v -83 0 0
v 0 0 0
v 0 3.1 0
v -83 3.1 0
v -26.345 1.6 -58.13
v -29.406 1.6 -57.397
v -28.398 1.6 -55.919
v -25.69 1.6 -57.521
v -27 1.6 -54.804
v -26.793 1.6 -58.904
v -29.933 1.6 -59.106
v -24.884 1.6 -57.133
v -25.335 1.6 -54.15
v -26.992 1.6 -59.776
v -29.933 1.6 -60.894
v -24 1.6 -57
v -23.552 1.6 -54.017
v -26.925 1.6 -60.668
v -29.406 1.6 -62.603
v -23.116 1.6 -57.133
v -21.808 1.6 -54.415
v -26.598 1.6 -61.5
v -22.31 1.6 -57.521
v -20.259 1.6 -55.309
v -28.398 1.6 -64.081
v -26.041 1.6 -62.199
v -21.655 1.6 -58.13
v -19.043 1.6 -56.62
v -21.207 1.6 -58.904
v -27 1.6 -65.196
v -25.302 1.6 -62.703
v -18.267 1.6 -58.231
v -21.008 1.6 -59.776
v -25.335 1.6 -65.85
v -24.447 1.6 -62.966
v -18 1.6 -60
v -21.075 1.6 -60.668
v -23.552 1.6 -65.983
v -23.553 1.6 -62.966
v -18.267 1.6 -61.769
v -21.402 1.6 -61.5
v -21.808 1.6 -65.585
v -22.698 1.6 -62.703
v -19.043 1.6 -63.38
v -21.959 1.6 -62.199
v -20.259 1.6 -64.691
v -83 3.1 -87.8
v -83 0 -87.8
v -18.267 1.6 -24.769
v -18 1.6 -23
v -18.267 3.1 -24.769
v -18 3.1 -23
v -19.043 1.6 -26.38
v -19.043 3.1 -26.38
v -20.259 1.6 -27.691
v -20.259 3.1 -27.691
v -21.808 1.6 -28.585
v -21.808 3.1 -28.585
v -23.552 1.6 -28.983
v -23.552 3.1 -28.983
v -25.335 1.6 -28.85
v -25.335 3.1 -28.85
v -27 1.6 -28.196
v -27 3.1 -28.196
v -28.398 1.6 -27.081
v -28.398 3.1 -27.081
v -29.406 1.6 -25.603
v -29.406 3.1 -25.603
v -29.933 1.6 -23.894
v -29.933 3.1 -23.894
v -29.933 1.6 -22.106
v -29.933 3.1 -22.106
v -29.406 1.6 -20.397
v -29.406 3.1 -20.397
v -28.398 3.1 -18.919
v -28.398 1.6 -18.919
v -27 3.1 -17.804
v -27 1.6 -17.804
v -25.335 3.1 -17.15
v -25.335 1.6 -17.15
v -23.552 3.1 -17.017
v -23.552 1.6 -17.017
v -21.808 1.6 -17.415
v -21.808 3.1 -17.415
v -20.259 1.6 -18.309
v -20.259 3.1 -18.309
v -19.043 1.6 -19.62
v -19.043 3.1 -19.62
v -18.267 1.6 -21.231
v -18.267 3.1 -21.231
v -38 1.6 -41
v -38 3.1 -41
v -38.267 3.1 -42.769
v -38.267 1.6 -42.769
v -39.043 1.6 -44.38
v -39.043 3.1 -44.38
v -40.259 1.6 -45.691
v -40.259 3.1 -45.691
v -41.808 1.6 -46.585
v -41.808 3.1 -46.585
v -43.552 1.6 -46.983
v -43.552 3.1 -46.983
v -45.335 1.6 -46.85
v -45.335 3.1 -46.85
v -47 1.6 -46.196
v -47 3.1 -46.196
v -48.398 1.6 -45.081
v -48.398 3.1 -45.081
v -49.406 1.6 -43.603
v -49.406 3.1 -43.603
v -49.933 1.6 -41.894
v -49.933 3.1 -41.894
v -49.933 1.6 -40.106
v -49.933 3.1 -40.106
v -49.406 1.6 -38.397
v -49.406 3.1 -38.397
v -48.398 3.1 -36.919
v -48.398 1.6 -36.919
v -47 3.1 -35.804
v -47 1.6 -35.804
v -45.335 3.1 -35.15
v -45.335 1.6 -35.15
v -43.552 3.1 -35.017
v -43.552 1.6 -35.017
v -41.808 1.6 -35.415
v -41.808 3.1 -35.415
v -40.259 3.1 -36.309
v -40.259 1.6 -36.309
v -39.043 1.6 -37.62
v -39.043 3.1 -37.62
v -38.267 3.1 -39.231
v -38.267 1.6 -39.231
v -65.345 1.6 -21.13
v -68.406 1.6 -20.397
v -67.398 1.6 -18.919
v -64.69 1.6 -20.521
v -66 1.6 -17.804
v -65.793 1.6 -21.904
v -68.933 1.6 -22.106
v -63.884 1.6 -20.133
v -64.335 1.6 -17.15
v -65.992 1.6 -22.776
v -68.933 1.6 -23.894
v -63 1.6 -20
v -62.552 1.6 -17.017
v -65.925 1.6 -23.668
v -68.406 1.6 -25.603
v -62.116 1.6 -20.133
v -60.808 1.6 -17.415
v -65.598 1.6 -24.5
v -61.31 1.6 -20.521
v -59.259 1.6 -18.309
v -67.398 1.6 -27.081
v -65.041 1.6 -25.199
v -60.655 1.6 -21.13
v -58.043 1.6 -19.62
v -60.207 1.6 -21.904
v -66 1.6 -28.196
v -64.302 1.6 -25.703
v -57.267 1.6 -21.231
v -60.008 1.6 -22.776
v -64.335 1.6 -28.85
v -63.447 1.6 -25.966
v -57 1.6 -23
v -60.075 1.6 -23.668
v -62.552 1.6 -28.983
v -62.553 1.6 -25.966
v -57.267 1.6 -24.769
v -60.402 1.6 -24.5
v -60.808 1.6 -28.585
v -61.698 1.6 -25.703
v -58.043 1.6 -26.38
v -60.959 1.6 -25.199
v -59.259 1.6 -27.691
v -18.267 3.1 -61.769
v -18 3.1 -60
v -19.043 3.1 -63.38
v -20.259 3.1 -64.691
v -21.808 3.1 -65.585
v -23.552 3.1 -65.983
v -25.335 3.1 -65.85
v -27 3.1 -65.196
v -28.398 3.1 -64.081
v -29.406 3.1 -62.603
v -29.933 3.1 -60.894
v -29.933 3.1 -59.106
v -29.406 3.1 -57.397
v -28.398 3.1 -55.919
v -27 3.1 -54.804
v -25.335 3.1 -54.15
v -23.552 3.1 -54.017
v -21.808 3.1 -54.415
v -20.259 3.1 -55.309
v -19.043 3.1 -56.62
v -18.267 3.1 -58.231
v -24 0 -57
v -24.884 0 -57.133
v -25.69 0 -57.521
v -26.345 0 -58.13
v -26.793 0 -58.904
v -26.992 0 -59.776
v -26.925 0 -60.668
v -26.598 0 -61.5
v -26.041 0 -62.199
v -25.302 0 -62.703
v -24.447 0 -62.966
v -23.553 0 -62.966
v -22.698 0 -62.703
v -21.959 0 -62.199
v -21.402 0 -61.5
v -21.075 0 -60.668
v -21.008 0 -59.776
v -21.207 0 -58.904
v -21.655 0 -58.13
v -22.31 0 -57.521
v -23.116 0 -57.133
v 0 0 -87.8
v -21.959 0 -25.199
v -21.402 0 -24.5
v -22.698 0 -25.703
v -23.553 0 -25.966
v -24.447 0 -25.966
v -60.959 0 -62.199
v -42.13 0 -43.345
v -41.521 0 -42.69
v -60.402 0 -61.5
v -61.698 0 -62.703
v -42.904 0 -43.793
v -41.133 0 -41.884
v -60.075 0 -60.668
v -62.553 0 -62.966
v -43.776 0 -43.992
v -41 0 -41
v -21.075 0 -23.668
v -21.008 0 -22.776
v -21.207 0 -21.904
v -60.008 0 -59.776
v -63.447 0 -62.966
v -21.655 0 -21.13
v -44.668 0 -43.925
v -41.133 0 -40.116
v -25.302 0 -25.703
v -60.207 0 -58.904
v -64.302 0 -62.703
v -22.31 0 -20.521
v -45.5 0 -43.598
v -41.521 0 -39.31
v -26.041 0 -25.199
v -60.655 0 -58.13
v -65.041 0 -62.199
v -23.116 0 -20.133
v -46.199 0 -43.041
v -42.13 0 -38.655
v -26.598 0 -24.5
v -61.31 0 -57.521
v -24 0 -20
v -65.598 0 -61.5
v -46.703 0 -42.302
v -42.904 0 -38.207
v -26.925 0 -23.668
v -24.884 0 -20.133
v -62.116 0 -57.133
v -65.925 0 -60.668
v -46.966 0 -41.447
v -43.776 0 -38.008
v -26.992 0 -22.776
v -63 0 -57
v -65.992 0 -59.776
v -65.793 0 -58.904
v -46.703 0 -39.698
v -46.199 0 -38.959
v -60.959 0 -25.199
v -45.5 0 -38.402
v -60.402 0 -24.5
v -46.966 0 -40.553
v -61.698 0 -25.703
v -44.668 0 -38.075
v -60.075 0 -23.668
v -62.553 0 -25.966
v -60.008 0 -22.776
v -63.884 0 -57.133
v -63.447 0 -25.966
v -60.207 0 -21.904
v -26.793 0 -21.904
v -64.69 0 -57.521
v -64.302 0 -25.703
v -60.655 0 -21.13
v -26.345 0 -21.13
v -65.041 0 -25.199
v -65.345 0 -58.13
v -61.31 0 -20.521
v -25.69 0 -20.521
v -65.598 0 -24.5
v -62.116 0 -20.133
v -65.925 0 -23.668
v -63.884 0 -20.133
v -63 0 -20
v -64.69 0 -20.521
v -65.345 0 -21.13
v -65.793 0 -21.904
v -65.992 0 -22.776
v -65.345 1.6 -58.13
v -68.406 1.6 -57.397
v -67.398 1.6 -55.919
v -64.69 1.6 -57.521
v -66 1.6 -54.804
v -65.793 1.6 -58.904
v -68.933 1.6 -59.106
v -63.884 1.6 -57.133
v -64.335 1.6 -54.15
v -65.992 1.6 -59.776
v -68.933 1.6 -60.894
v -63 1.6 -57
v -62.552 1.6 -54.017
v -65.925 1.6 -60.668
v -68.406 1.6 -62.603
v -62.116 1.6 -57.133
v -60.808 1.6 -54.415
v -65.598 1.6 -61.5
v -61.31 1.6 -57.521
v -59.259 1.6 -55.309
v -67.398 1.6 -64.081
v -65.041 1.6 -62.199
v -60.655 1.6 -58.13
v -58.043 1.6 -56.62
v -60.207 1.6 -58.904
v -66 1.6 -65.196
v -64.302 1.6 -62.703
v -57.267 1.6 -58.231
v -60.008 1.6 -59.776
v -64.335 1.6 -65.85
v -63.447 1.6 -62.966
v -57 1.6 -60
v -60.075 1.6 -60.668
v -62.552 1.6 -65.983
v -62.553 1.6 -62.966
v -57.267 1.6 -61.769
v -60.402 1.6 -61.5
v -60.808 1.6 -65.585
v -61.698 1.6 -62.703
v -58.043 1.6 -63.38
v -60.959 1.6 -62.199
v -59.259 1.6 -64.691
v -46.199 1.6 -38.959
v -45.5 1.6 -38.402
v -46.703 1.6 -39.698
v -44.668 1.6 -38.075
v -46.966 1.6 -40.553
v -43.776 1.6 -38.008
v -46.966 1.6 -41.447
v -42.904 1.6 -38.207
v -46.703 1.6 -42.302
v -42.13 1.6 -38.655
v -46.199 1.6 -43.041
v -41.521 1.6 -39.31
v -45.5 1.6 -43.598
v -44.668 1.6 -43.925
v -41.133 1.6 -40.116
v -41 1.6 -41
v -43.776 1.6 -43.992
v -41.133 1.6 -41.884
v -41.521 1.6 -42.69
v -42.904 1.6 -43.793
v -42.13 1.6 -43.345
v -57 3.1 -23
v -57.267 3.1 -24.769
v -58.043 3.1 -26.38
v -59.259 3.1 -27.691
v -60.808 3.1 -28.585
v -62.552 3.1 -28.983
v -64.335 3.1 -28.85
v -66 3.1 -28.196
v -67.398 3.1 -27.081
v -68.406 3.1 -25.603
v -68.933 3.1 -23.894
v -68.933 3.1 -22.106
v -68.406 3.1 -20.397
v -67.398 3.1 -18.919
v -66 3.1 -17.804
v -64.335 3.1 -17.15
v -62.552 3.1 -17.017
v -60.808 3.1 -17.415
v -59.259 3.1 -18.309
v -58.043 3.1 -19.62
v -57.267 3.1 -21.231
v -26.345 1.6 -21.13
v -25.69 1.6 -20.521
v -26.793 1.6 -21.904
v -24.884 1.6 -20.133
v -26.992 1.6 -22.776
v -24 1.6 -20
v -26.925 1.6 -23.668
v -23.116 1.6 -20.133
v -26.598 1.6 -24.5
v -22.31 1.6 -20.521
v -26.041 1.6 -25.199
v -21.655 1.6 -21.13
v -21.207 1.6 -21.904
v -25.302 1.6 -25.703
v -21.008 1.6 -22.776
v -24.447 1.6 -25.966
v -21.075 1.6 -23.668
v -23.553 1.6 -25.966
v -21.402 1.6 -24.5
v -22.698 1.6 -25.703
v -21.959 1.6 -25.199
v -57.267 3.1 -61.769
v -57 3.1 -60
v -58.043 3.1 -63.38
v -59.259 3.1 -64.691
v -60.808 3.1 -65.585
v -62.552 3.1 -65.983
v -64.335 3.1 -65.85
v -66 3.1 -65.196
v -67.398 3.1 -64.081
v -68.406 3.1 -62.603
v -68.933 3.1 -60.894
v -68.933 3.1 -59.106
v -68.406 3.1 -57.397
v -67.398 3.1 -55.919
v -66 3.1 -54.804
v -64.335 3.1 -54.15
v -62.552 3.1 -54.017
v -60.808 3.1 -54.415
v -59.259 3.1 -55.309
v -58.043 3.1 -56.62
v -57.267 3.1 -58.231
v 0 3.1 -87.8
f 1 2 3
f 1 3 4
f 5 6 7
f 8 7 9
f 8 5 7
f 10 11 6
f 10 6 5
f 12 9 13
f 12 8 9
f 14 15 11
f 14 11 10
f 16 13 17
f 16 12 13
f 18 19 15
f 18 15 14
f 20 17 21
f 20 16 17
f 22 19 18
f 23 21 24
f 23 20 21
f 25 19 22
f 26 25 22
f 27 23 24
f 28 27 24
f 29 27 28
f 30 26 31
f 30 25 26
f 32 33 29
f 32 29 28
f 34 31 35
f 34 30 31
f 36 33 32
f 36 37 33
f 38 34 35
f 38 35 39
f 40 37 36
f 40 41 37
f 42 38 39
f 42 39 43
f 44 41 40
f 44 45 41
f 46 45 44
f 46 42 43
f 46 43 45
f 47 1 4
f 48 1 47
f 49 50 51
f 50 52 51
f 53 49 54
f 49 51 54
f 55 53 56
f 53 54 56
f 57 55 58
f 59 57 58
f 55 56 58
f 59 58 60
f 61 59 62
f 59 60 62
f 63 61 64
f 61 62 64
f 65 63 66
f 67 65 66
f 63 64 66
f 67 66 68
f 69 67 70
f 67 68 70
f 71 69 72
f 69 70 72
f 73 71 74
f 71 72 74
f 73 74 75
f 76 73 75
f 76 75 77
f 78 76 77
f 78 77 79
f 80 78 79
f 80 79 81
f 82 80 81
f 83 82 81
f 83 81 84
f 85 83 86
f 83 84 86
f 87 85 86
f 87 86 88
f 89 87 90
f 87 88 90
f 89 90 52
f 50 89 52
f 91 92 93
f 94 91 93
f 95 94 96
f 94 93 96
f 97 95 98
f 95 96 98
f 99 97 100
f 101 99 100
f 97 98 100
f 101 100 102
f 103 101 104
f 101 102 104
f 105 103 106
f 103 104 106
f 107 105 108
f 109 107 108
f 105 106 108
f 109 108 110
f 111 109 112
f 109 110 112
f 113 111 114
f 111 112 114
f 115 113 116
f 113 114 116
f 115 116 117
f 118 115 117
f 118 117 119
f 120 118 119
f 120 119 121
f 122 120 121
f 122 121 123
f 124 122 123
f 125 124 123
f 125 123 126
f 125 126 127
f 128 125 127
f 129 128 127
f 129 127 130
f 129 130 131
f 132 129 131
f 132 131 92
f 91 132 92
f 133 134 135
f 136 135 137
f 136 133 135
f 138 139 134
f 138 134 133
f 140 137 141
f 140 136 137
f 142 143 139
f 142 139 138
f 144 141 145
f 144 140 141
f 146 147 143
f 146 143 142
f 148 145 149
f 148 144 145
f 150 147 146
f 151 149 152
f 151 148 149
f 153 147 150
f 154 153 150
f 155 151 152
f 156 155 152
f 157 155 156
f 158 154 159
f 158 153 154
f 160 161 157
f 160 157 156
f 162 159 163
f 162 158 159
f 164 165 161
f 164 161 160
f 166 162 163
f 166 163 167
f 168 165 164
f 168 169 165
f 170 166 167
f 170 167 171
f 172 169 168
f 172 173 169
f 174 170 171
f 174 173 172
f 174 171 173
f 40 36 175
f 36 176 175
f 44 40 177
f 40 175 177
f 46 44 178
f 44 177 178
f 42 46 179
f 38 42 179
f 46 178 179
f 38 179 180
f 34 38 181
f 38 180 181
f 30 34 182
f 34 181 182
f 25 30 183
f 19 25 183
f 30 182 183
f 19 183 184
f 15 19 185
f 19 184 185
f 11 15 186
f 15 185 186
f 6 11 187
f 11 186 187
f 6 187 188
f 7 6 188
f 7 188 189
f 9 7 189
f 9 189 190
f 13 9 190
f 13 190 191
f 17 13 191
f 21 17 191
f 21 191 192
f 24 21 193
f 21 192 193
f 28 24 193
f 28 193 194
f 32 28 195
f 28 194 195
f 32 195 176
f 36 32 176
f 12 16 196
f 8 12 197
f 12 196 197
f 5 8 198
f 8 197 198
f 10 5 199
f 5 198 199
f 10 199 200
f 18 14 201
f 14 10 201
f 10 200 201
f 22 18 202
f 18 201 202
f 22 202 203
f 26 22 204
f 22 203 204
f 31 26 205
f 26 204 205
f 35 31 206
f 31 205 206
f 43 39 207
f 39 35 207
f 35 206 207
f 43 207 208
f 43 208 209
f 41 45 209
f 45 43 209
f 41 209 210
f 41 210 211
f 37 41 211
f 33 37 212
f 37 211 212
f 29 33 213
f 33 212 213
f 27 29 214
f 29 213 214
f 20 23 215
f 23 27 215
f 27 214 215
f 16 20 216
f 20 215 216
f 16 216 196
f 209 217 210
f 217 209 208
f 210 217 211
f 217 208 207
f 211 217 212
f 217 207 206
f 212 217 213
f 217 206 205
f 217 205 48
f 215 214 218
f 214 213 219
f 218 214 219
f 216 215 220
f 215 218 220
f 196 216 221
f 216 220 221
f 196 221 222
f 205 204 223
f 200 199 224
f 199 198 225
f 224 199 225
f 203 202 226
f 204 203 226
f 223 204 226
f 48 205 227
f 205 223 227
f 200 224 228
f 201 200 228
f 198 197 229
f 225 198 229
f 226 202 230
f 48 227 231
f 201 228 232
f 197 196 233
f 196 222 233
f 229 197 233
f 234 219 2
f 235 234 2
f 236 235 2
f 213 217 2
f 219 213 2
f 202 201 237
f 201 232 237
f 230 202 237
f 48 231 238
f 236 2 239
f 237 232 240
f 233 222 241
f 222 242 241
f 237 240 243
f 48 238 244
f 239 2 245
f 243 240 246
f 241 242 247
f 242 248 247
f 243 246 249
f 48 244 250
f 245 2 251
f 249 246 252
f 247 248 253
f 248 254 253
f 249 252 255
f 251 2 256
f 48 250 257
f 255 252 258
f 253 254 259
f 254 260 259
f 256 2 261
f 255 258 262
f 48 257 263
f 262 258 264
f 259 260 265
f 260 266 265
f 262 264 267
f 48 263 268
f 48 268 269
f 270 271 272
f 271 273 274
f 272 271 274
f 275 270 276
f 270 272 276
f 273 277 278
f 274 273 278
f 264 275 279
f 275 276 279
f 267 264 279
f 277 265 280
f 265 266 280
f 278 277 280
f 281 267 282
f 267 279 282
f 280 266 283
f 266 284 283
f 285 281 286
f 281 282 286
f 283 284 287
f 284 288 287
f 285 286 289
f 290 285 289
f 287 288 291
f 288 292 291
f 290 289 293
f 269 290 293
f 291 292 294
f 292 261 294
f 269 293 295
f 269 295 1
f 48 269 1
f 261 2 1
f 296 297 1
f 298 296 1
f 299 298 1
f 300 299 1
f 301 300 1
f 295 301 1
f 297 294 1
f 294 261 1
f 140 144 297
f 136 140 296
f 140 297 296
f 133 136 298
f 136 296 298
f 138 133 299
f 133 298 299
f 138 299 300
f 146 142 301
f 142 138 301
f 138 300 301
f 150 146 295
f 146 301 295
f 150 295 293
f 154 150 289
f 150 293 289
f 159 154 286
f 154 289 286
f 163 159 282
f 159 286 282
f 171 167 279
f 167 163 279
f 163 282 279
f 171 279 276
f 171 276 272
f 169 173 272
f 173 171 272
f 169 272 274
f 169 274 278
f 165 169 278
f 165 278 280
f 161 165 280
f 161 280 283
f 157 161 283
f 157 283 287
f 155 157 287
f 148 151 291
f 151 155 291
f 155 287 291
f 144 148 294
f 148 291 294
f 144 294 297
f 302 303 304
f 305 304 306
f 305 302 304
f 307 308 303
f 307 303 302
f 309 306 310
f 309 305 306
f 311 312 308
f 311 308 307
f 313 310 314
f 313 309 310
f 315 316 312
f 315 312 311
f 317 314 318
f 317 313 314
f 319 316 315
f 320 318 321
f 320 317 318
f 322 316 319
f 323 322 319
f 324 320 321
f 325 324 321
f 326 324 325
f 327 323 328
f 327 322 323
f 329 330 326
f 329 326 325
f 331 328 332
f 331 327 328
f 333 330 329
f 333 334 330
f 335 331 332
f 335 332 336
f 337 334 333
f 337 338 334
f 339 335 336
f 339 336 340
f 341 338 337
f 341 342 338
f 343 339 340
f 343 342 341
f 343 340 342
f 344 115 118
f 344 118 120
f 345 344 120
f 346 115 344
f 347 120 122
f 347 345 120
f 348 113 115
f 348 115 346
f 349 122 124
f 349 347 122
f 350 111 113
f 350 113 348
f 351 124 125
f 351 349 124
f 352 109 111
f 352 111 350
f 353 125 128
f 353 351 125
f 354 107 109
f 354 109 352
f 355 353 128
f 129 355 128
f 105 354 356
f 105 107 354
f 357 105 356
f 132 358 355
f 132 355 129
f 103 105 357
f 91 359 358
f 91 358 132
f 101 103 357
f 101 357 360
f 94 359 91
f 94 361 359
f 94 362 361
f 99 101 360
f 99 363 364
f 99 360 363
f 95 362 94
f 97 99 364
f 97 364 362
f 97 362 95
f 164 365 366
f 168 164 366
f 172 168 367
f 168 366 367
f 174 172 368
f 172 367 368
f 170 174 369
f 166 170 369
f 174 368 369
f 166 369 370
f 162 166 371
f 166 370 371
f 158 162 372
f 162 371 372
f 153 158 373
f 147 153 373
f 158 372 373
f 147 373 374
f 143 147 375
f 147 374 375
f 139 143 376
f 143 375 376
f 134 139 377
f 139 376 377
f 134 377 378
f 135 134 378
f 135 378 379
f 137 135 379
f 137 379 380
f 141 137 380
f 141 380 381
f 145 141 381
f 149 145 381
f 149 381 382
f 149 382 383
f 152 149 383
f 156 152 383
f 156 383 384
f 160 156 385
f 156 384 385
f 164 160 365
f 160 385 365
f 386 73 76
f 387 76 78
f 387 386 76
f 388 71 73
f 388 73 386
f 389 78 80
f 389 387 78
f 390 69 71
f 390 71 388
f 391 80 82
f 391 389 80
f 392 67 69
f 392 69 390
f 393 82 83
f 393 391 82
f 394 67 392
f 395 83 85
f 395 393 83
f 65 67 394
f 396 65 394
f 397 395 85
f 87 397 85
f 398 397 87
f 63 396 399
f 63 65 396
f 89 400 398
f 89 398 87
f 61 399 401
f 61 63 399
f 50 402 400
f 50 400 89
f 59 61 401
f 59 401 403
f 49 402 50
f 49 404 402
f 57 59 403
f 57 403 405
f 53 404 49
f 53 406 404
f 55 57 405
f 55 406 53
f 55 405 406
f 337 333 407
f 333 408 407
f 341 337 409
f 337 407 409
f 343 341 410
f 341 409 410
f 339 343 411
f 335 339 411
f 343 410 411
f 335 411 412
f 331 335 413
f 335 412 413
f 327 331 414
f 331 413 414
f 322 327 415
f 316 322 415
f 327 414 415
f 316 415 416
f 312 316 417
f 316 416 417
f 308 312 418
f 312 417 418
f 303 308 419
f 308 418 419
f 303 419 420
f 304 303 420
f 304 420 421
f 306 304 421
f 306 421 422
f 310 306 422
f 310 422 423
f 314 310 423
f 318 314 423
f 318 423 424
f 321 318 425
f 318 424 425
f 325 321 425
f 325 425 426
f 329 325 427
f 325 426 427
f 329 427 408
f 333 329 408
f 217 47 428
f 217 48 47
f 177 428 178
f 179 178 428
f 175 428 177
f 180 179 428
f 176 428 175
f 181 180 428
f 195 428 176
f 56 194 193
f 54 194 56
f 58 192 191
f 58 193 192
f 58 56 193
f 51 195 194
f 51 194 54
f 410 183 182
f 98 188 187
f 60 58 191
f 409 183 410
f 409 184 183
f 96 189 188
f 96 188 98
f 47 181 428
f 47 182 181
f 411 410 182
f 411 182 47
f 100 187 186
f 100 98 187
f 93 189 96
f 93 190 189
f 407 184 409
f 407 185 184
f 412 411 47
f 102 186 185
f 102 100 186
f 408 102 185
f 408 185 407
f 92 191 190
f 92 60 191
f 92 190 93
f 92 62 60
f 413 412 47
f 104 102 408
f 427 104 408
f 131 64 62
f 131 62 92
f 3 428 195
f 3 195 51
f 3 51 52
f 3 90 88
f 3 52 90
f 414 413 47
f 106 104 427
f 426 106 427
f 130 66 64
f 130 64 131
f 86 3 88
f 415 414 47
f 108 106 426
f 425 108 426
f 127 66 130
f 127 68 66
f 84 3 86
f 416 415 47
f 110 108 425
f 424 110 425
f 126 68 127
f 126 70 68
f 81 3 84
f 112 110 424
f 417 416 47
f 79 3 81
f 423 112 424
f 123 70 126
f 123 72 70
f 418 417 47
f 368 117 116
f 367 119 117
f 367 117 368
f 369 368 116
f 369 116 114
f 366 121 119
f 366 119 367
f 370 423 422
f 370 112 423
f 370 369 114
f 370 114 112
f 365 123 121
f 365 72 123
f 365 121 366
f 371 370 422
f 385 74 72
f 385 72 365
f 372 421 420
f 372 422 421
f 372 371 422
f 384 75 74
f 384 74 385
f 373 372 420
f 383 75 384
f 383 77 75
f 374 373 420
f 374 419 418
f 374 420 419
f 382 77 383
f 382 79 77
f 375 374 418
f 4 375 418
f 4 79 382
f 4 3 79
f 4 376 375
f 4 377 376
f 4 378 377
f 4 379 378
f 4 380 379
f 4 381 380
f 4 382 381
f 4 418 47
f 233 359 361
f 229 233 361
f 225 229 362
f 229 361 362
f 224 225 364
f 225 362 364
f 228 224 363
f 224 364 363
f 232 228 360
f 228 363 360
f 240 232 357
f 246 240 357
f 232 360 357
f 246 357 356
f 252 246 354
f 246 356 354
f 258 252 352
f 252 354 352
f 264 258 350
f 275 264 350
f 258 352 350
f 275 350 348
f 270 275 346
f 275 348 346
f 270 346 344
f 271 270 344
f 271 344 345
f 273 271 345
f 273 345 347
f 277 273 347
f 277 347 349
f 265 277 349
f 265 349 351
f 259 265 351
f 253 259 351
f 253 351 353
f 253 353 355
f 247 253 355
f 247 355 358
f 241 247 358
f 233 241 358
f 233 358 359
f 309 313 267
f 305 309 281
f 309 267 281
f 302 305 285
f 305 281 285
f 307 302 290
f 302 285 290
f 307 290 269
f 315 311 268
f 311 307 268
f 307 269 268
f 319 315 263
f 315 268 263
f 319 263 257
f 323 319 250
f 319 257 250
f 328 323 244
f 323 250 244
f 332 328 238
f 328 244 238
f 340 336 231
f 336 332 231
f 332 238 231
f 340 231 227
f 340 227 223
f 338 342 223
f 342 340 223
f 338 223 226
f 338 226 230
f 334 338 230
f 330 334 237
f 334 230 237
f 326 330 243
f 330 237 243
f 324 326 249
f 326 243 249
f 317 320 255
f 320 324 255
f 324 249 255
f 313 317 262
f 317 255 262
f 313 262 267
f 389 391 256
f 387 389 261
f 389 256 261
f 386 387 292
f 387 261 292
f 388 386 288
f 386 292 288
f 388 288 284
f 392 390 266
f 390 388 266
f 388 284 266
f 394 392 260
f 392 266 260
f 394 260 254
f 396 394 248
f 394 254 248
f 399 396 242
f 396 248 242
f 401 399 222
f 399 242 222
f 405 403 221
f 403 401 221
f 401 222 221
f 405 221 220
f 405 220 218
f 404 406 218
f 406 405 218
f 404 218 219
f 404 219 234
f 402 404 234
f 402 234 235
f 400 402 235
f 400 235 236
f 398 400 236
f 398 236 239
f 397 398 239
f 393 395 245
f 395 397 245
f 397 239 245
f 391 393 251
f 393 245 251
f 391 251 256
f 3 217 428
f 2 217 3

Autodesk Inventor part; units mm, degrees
ref_plane "YZ Plane" through (0, 0, 0) normal (1, 0, 0) x (0, 1, 0)
ref_plane "XZ Plane" through (0, 0, 0) normal (0, 1, 0) x (-1, 0, 0)
ref_plane "XY Plane" through (0, 0, 0) normal (0, 0, 1) x (1, 0, 0)
sketch "草圖1" plane through (0, 0, 0) normal (0, 1, 0) x (-1, 0, 0)
  line L0 (0, 0) -> (83, 0)
  line L1 (83, 0) -> (83, -87.8)
  line L2 (83, -87.8) -> (0, -87.8)
  line L3 (0, -87.8) -> (0, 0)
  dimension "d0" = 87.8
  dimension "d1" = 83
extrude "擠出1" add sketch "草圖1" along normal blind 3.1
sketch "草圖2" plane through (0, 3.1, 0) normal (0, 1, 0) x (1, 0, 0)
  line L0 (-24, -18.3432) -> (-24, 108.3328)
  line L1 (-63, -18.3432) -> (-63, 117.1807)
  line L2 (-93.8741, 60) -> (24.8173, 60)
  line L3 (19.8538, 23) -> (-101.6429, 23)
  line L4 (-44, -5.6109) -> (-44, 94.0899)
  line L5 (-89.7738, 41) -> (11.6533, 41)
  line L6 (-83, 0) -> (0, 0) projected
  line L7 (0, 0) -> (0, 87.8) projected
  circle A0 centre (-63, 23) radius 6
  circle A1 centre (-24, 23) radius 6
  circle A2 centre (-24, 60) radius 6
  circle A3 centre (-63, 60) radius 6
  circle A4 centre (-44, 41) radius 6
  dimension "d4" = 23
  dimension "d5" = 37
  dimension "d6" = 24
  dimension "d7" = 44
  dimension "d8" = 39
  dimension "d9" = 41
  dimension "d10" = 12
  dimension "d11" = 12
  dimension "d12" = 12
  dimension "d13" = 12
  dimension "d14" = 12
hole "孔1" at (-24, 3.1, -23) at (-63, 3.1, -23) at (-63, 3.1, -60) at (-24, 3.1, -60) direction (0, -1, 0) diameter 6 end through all
sketch "草圖4" plane through (0, 3.1, 0) normal (0, 1, 0) x (1, 0, 0)
  point P0 (0, 0)
sketch "草圖5" plane through (0, 3.1, 0) normal (0, 1, 0) x (1, 0, 0)
  circle A0 centre (-24, 23) radius 3 projected
  circle A1 centre (-24, 23) radius 6
  point P0 (0, 0)
  dimension "d40" = 12
extrude "擠出2" cut sketch "草圖5" against normal blind 1.5
pattern_linear "矩形陣列2" count 2 spacing 39 along (-1, 0, 0) of "擠出2"
sketch "草圖6" plane through (0, 3.1, 0) normal (0, 1, 0) x (1, 0, 0)
  circle A0 centre (-63, 60) radius 3 projected
  circle A1 centre (-63, 60) radius 6
  circle A2 centre (-24, 60) radius 3 projected
  circle A3 centre (-24, 60) radius 6
  point P0 (0, 0)
  dimension "d46" = 12
  dimension "d47" = 12
extrude "擠出3" cut sketch "草圖6" against normal blind 1.5
sketch "草圖7" plane through (0, 3.1, 0) normal (0, 1, 0) x (1, 0, 0)
  circle A0 centre (-44, 41) radius 3
  line L0 (-83, 0) -> (0, 0) projected
  line L1 (0, 0) -> (0, 87.8) projected
  dimension "d50" = 6
  dimension "d51" = 41
  dimension "d52" = 44
extrude "擠出4" cut sketch "草圖7" against normal blind 5
sketch "草圖8" plane through (0, 3.1, 0) normal (0, 1, 0) x (1, 0, 0)
  circle A0 centre (-44, 41) radius 3 projected
  circle A1 centre (-44, 41) radius 6
  point P0 (0, 0)
  dimension "d55" = 12
extrude "擠出5" cut sketch "草圖8" against normal blind 1.5
properties part number "底板" material "鋁合金 6061"
